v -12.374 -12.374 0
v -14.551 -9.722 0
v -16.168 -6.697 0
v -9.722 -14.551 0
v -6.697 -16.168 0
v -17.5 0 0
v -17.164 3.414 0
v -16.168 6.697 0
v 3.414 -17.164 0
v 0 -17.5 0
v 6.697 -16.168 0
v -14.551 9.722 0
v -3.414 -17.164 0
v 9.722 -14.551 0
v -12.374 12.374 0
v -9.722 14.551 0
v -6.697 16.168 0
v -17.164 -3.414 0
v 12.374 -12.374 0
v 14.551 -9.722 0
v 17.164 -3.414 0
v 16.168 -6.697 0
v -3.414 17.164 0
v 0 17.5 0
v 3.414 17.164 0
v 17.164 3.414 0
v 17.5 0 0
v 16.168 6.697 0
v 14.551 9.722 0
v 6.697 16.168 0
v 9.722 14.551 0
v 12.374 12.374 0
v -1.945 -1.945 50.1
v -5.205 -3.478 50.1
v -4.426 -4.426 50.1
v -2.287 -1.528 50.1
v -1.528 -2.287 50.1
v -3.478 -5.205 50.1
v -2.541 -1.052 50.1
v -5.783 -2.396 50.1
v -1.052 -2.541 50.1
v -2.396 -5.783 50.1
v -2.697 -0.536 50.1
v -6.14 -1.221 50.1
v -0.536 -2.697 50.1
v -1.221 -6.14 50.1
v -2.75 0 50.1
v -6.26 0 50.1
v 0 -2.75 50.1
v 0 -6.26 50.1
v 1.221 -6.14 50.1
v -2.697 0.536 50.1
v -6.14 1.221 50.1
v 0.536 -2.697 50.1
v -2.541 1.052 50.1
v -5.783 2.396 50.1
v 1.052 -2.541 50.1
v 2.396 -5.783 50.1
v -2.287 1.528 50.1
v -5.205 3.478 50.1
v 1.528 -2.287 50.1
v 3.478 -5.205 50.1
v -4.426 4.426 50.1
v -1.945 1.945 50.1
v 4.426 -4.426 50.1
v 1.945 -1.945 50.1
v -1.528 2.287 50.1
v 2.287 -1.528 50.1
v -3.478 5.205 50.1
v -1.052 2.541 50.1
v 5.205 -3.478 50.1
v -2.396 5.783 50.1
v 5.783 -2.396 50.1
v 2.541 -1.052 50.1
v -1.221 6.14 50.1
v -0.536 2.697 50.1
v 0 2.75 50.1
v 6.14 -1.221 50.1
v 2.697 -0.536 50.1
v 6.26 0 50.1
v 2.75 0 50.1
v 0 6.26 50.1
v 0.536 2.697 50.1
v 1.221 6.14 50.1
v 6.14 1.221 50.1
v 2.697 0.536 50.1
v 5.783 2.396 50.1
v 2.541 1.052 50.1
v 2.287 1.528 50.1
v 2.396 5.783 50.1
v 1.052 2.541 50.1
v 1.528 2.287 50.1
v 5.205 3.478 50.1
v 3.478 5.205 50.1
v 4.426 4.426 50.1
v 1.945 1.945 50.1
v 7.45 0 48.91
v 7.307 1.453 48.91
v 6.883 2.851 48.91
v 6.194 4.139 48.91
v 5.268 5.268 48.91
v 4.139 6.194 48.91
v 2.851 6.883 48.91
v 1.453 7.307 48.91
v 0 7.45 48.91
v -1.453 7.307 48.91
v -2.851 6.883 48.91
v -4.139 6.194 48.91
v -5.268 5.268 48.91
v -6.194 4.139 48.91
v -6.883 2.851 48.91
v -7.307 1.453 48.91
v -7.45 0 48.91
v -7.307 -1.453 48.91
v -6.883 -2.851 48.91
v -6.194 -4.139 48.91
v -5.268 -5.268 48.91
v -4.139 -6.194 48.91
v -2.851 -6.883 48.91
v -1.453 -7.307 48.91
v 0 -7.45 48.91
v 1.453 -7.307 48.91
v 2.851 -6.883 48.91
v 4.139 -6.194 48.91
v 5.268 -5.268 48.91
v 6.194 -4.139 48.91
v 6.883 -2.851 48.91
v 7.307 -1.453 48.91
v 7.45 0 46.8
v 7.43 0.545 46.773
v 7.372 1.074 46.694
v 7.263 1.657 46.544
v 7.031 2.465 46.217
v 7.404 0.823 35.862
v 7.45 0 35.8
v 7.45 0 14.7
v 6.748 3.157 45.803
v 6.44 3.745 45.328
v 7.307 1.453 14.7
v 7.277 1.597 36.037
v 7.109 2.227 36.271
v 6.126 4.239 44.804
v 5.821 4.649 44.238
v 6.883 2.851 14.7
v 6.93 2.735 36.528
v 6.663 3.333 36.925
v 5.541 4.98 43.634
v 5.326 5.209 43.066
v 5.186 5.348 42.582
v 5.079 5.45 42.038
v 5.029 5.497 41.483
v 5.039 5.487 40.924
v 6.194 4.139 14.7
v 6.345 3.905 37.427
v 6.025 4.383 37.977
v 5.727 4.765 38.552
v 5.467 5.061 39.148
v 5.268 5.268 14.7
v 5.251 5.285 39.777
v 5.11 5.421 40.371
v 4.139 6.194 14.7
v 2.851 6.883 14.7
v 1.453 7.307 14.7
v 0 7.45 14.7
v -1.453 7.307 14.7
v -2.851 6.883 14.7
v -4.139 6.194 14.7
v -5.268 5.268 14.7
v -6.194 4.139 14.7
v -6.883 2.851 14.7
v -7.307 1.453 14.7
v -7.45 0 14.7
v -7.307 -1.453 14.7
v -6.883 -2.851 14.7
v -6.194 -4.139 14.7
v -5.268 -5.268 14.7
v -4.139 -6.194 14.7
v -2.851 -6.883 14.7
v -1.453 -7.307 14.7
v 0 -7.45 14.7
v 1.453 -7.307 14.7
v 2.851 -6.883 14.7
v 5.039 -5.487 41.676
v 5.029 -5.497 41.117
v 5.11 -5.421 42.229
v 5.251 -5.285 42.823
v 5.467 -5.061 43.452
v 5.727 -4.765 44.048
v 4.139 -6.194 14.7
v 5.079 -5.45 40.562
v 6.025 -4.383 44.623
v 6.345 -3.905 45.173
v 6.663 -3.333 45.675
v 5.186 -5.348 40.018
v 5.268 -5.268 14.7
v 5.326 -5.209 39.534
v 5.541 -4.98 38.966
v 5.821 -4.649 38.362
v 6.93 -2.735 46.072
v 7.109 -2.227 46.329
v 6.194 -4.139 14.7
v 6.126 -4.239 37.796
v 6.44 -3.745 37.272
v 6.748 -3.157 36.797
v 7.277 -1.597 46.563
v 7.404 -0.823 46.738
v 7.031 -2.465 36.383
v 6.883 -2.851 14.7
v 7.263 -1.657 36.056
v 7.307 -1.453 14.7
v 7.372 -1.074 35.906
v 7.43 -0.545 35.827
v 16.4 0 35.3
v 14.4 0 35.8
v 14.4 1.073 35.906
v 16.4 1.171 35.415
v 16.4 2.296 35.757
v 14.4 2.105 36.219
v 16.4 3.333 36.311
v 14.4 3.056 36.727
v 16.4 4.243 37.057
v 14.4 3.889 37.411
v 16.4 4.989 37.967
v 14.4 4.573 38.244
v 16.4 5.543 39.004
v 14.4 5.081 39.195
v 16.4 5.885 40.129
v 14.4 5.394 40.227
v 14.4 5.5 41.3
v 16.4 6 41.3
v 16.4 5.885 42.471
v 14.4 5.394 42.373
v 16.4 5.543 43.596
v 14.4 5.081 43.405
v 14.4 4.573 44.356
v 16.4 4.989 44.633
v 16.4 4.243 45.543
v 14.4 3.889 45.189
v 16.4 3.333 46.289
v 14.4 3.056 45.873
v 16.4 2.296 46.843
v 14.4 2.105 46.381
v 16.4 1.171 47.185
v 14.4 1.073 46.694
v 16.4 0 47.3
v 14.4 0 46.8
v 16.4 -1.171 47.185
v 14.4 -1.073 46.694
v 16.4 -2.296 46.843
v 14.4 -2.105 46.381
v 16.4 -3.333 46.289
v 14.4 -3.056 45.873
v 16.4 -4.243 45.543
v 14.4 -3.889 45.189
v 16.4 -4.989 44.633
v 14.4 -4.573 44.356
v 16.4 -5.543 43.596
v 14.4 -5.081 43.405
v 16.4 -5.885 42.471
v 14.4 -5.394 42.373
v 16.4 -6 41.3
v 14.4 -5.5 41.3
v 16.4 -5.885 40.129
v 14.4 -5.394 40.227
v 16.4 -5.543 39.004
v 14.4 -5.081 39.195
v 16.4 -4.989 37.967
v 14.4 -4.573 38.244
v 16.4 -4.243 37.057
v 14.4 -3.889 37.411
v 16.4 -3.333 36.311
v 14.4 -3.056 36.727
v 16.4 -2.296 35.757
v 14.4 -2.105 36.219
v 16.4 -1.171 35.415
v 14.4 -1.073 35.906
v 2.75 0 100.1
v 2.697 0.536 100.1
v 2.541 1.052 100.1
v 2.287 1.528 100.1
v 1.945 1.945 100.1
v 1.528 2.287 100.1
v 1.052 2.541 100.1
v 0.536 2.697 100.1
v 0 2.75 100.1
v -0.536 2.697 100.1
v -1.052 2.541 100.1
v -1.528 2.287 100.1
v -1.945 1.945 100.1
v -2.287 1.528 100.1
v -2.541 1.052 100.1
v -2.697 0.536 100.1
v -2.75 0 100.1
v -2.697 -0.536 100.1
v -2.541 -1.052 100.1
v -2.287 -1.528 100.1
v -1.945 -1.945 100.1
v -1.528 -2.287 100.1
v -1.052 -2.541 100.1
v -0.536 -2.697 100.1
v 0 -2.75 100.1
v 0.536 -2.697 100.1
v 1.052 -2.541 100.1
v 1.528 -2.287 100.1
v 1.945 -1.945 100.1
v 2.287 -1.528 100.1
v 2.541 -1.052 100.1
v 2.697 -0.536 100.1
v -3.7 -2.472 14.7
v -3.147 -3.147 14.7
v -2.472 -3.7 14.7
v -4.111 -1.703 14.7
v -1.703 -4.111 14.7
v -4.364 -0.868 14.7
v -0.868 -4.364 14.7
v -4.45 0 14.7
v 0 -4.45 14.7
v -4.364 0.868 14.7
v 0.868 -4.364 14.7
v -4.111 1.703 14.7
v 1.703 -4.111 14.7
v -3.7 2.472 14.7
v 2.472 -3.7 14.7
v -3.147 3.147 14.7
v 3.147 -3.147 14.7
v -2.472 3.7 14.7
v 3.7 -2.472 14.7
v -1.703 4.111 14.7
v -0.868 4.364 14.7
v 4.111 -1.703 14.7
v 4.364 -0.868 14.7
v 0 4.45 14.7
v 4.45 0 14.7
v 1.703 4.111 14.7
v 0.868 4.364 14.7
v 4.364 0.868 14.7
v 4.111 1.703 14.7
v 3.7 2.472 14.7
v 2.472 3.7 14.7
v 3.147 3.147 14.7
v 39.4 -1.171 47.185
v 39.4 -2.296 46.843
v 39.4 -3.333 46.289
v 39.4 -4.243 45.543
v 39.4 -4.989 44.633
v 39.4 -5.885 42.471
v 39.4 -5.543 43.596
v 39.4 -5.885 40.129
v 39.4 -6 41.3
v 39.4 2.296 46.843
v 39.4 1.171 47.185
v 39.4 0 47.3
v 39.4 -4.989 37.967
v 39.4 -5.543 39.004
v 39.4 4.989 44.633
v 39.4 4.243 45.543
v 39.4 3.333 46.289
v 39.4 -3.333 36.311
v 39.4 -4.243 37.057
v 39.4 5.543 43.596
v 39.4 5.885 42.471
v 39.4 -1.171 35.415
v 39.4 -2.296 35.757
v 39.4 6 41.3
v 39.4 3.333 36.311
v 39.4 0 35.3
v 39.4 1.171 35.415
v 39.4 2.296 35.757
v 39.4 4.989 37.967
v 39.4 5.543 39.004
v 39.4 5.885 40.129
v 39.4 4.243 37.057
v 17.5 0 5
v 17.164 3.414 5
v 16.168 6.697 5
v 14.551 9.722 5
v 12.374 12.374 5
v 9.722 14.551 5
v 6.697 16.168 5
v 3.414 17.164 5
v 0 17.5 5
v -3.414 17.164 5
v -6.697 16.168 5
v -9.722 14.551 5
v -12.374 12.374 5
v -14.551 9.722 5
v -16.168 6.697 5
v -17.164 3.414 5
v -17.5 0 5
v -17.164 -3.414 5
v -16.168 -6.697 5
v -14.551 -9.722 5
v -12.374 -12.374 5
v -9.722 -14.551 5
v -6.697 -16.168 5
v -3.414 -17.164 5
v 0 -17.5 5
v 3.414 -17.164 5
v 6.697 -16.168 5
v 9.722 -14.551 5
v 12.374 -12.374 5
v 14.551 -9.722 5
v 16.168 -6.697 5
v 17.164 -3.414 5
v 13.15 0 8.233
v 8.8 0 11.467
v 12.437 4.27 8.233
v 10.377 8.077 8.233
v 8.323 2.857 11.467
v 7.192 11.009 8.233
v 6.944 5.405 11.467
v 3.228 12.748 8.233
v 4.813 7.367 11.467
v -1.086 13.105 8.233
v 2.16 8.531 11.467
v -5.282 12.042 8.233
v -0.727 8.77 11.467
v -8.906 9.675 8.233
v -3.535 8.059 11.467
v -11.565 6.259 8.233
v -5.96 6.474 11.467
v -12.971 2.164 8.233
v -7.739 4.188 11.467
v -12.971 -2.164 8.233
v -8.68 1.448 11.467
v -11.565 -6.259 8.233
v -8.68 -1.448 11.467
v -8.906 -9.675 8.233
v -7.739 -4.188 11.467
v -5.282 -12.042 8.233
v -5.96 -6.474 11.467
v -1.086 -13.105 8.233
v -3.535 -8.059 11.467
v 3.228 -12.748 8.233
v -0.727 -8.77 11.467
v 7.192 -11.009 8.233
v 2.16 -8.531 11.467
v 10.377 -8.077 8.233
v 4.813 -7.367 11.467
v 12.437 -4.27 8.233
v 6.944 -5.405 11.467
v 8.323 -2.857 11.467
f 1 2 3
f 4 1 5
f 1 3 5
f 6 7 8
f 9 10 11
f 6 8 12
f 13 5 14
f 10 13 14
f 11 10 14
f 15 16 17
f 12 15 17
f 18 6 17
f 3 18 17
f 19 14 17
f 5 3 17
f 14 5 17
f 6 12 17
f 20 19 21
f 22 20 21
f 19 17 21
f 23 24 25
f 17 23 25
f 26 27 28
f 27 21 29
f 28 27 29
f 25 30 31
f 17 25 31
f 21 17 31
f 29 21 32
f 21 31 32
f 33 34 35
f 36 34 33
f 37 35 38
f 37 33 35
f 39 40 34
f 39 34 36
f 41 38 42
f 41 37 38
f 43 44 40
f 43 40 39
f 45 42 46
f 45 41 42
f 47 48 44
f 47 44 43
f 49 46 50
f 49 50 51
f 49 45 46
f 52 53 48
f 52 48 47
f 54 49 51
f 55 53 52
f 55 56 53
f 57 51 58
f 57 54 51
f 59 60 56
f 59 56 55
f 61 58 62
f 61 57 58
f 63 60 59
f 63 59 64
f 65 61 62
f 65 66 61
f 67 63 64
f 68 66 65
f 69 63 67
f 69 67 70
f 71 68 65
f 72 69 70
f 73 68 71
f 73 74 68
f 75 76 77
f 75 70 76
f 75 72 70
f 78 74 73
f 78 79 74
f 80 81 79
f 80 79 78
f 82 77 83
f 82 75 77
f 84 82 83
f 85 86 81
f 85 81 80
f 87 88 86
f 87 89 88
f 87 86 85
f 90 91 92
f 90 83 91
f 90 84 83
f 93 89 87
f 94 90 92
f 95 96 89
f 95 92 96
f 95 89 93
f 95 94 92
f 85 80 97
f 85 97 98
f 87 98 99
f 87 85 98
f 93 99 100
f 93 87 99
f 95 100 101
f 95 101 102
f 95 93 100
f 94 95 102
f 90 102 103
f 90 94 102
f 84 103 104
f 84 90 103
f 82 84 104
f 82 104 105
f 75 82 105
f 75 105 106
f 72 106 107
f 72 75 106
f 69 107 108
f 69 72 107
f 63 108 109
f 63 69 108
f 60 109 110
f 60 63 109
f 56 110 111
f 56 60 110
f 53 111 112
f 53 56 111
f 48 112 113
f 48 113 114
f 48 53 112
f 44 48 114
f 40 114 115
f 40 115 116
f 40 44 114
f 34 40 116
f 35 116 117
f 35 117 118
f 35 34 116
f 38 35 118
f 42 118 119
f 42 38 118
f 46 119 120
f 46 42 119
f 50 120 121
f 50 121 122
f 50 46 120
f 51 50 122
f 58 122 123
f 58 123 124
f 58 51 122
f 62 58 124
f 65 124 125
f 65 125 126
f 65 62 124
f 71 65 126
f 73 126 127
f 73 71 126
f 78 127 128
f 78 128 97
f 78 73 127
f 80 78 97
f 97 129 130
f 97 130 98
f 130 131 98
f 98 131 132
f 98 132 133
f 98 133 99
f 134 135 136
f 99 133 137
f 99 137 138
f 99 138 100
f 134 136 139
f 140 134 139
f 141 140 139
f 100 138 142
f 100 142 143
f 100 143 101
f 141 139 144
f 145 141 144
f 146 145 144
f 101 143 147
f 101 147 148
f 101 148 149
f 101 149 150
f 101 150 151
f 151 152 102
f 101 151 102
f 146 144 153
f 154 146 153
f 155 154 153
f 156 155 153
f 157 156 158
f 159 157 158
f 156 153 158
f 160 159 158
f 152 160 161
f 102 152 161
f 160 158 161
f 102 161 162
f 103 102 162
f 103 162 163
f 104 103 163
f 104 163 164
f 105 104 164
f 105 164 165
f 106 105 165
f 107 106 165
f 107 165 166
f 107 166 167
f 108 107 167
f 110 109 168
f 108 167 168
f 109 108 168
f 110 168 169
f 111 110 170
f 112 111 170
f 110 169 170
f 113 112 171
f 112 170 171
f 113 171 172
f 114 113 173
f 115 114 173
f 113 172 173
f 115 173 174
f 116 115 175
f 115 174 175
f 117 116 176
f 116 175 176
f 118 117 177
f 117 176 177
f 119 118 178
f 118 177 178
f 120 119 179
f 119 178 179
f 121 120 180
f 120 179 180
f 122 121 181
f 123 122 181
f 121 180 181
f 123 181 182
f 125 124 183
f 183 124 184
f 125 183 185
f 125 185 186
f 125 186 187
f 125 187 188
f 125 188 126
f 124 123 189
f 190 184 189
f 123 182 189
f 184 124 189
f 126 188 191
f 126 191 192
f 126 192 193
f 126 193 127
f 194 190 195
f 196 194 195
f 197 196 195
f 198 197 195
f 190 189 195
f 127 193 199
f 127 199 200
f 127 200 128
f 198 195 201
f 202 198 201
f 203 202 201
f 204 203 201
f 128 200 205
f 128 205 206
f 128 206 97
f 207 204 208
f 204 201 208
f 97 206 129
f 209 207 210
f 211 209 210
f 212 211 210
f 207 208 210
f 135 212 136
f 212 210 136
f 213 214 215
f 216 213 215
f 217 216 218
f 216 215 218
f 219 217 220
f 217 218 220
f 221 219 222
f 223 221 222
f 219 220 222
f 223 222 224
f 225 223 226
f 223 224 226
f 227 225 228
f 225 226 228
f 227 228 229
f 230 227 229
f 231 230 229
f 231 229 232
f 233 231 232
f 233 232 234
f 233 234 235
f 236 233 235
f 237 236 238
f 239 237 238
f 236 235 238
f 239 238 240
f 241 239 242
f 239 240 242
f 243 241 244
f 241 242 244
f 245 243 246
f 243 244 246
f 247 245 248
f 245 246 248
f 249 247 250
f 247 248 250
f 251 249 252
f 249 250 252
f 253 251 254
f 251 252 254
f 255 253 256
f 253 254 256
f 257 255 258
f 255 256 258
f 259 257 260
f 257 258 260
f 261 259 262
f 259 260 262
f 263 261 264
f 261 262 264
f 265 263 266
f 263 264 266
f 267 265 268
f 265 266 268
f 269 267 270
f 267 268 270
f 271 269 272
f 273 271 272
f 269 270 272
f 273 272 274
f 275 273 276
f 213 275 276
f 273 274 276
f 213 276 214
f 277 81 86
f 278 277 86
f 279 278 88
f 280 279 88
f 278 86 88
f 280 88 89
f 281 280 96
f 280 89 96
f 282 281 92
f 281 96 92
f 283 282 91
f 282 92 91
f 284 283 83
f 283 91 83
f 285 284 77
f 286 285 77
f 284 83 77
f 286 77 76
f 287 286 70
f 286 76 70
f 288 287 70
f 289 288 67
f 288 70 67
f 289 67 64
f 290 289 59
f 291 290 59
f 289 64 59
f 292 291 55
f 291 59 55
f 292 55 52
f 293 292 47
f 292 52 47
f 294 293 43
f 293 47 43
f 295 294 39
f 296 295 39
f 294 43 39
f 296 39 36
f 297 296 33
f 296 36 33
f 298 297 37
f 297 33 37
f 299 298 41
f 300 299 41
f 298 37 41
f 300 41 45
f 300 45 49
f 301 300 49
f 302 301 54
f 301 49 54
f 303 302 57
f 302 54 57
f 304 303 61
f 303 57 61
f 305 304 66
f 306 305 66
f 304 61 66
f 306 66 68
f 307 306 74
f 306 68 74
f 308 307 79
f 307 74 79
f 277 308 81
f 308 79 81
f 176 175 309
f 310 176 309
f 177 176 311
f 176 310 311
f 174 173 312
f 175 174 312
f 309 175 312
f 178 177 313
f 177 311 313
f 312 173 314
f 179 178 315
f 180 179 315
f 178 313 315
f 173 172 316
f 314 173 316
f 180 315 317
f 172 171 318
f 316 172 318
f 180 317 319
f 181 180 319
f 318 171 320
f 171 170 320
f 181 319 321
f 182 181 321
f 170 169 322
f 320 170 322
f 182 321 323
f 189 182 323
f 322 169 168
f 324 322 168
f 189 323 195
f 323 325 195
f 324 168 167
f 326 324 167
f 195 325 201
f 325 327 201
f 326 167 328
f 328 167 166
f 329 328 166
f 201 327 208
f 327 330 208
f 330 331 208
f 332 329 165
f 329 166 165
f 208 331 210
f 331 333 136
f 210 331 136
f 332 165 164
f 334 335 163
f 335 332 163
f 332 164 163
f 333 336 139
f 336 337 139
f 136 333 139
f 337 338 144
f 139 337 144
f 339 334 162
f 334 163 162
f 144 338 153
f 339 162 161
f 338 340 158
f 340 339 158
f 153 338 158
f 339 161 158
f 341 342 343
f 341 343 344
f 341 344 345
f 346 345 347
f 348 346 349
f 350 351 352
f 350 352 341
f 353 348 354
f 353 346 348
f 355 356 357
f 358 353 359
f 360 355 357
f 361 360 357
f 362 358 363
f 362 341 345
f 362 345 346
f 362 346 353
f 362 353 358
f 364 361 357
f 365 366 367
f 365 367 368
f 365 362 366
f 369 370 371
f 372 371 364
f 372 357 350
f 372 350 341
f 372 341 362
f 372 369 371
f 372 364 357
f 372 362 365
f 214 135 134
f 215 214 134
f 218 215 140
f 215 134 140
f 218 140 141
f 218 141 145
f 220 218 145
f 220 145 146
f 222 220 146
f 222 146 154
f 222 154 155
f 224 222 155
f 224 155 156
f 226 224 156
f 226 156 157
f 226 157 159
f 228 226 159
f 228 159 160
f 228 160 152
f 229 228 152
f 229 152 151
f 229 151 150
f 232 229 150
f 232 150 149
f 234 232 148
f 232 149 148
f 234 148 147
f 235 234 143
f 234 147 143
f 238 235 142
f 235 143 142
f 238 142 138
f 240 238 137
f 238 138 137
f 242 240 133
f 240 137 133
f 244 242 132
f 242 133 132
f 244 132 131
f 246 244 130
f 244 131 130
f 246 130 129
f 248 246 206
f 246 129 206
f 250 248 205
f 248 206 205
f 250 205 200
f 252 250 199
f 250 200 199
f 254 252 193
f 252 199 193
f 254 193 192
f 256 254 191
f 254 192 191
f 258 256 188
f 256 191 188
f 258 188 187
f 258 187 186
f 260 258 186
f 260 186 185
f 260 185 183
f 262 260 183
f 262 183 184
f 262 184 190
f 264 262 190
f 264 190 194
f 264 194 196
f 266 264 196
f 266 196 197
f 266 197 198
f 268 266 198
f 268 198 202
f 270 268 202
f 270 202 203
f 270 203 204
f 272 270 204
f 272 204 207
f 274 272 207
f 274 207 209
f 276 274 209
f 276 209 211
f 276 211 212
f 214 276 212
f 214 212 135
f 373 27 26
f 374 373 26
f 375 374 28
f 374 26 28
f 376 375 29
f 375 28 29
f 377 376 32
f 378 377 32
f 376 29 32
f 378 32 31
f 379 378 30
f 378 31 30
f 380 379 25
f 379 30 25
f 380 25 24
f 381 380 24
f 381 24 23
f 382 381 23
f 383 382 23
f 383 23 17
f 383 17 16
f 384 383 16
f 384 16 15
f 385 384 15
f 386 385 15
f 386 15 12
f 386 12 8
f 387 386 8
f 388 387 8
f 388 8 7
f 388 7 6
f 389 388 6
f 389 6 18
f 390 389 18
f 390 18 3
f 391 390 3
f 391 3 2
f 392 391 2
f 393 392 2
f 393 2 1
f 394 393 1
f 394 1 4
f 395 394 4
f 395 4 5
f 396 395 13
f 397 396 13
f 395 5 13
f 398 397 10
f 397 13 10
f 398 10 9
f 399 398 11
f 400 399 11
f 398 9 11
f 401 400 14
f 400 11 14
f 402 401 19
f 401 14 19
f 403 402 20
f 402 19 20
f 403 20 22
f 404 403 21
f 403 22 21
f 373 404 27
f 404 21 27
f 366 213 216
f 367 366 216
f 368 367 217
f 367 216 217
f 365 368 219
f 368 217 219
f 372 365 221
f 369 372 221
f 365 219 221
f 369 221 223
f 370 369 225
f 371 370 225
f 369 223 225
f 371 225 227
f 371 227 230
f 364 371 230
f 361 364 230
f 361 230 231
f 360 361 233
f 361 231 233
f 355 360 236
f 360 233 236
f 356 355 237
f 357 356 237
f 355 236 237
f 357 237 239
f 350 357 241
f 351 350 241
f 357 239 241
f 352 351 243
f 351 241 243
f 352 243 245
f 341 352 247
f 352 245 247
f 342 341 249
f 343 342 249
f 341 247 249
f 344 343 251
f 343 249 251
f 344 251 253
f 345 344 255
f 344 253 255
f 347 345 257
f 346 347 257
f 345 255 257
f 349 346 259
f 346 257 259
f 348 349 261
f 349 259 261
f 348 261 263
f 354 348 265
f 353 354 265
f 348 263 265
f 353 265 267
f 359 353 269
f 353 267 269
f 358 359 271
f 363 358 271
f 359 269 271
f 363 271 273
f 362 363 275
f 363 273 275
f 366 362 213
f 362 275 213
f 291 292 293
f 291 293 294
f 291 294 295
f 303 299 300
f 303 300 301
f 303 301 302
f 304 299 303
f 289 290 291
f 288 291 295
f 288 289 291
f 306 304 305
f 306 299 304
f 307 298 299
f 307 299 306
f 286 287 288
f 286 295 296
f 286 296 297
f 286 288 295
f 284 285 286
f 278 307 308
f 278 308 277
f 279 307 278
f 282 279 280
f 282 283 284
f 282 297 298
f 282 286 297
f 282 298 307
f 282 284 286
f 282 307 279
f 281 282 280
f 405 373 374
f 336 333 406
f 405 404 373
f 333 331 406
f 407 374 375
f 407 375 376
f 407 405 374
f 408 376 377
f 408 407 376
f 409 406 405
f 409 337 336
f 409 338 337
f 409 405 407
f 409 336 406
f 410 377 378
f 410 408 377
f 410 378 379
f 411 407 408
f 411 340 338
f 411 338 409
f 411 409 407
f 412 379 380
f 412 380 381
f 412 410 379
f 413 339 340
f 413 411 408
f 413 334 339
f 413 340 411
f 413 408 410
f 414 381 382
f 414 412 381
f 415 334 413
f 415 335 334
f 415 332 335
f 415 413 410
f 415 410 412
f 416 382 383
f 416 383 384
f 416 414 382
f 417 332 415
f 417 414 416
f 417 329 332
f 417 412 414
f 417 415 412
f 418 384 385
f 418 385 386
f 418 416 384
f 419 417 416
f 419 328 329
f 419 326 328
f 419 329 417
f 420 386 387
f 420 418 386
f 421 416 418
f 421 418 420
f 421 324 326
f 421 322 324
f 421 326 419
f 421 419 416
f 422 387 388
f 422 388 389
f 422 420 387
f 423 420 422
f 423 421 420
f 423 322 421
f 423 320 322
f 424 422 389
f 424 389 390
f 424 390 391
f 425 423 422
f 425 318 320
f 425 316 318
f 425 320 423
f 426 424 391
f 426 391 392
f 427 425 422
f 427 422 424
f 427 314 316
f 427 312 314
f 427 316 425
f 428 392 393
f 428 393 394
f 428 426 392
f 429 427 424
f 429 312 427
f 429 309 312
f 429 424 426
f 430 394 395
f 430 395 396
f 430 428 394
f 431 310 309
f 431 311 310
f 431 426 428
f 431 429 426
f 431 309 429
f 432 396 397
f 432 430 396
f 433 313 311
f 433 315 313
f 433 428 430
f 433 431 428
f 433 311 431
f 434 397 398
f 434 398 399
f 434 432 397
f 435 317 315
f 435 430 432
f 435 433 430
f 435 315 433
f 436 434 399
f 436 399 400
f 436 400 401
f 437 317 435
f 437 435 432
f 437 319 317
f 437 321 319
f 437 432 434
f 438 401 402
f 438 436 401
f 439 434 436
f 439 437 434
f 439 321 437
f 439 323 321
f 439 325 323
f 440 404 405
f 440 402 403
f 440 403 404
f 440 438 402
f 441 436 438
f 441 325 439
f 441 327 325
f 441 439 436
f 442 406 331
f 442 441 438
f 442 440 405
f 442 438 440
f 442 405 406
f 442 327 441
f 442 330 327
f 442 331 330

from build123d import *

# Parameters (mm, degrees)
ESQUISSE1_R        = 17.5
BOSS_EXTRU_1_DEPTH = 5
ESQUISSE2_R        = 17.5
BOSS_EXTRU_2_DEPTH = 9.7
CHANFREIN1_SIZE    = 9.7
CHANFREIN1_SIZE2   = 13.05
ESQUISSE3_R        = 7.45
BOSS_EXTRU_3_DEPTH = 35.4
ESQUISSE4_R        = 2.75
BOSS_EXTRU_4_DEPTH = 50
ESQUISSE5_R        = 5.5
BOSS_EXTRU_5_DEPTH = 14.4
CHANFREIN2_SIZE    = 1.19
ESQUISSE6_R        = 6
BOSS_EXTRU_6_DEPTH = 25
CHANFREIN3_SIZE2   = 0.5
CHANFREIN3_SIZE    = 2


with BuildPart() as part:
    # Esquisse1 → Boss.-Extru.1 (new body)
    with BuildSketch(Plane.XY):
        Circle(ESQUISSE1_R)
    extrude(amount=BOSS_EXTRU_1_DEPTH)

    # Esquisse2 → Boss.-Extru.2 (add)
    with BuildSketch(Plane.XY.offset(5)):
        Circle(ESQUISSE2_R)
    extrude(amount=BOSS_EXTRU_2_DEPTH)

    # Chanfrein1
    chanfrein1_edges = [part.edges().sort_by_distance(p)[0] for p in [
        (-17.5, 0, 14.7),
    ]]
    chanfrein1_side = [part.faces().sort_by_distance(p)[0] for p in [
        (-17.5, 0, 7.35),
    ]]
    chamfer(chanfrein1_edges, length=CHANFREIN1_SIZE, length2=CHANFREIN1_SIZE2, reference=chanfrein1_side[0])

    # Esquisse3 → Boss.-Extru.3 (add)
    with BuildSketch(Plane.XY.offset(14.7)):
        Circle(ESQUISSE3_R)
    extrude(amount=BOSS_EXTRU_3_DEPTH)

    # Esquisse4 → Boss.-Extru.4 (add)
    with BuildSketch(Plane.XY.offset(50.1)):
        Circle(ESQUISSE4_R)
    extrude(amount=BOSS_EXTRU_4_DEPTH)

    # Esquisse5 → Boss.-Extru.5 (add)
    with BuildSketch(Plane(origin=(0, 0, 0), x_dir=(0, 0, -1), z_dir=(1, 0, 0))):
        with Locations((-41.3, 0)):
            Circle(ESQUISSE5_R)
    extrude(amount=BOSS_EXTRU_5_DEPTH)

    # Chanfrein2
    chanfrein2_edges = [part.edges().sort_by_distance(p)[0] for p in [
        (-7.45, 0, 50.1),
    ]]
    chamfer(chanfrein2_edges, length=CHANFREIN2_SIZE)

    # Esquisse6 → Boss.-Extru.6 (add)
    with BuildSketch(Plane(origin=(14.4, 0, 0), x_dir=(0, 0, -1), z_dir=(1, 0, 0))):
        with Locations((-41.3, 0)):
            Circle(ESQUISSE6_R)
    extrude(amount=BOSS_EXTRU_6_DEPTH)

    # Chanfrein3
    chanfrein3_edges = [part.edges().sort_by_distance(p)[0] for p in [
        (14.4, 0, 47.3),
    ]]
    chanfrein3_side = [part.faces().sort_by_distance(p)[0] for p in [
        (14.41, 0, 47.3),
    ]]
    chamfer(chanfrein3_edges, length=CHANFREIN3_SIZE - 0.0001, length2=CHANFREIN3_SIZE2 - 0.0001, reference=chanfrein3_side[0])  # a hair under: the kernel refuses the full size


solid = part.part
